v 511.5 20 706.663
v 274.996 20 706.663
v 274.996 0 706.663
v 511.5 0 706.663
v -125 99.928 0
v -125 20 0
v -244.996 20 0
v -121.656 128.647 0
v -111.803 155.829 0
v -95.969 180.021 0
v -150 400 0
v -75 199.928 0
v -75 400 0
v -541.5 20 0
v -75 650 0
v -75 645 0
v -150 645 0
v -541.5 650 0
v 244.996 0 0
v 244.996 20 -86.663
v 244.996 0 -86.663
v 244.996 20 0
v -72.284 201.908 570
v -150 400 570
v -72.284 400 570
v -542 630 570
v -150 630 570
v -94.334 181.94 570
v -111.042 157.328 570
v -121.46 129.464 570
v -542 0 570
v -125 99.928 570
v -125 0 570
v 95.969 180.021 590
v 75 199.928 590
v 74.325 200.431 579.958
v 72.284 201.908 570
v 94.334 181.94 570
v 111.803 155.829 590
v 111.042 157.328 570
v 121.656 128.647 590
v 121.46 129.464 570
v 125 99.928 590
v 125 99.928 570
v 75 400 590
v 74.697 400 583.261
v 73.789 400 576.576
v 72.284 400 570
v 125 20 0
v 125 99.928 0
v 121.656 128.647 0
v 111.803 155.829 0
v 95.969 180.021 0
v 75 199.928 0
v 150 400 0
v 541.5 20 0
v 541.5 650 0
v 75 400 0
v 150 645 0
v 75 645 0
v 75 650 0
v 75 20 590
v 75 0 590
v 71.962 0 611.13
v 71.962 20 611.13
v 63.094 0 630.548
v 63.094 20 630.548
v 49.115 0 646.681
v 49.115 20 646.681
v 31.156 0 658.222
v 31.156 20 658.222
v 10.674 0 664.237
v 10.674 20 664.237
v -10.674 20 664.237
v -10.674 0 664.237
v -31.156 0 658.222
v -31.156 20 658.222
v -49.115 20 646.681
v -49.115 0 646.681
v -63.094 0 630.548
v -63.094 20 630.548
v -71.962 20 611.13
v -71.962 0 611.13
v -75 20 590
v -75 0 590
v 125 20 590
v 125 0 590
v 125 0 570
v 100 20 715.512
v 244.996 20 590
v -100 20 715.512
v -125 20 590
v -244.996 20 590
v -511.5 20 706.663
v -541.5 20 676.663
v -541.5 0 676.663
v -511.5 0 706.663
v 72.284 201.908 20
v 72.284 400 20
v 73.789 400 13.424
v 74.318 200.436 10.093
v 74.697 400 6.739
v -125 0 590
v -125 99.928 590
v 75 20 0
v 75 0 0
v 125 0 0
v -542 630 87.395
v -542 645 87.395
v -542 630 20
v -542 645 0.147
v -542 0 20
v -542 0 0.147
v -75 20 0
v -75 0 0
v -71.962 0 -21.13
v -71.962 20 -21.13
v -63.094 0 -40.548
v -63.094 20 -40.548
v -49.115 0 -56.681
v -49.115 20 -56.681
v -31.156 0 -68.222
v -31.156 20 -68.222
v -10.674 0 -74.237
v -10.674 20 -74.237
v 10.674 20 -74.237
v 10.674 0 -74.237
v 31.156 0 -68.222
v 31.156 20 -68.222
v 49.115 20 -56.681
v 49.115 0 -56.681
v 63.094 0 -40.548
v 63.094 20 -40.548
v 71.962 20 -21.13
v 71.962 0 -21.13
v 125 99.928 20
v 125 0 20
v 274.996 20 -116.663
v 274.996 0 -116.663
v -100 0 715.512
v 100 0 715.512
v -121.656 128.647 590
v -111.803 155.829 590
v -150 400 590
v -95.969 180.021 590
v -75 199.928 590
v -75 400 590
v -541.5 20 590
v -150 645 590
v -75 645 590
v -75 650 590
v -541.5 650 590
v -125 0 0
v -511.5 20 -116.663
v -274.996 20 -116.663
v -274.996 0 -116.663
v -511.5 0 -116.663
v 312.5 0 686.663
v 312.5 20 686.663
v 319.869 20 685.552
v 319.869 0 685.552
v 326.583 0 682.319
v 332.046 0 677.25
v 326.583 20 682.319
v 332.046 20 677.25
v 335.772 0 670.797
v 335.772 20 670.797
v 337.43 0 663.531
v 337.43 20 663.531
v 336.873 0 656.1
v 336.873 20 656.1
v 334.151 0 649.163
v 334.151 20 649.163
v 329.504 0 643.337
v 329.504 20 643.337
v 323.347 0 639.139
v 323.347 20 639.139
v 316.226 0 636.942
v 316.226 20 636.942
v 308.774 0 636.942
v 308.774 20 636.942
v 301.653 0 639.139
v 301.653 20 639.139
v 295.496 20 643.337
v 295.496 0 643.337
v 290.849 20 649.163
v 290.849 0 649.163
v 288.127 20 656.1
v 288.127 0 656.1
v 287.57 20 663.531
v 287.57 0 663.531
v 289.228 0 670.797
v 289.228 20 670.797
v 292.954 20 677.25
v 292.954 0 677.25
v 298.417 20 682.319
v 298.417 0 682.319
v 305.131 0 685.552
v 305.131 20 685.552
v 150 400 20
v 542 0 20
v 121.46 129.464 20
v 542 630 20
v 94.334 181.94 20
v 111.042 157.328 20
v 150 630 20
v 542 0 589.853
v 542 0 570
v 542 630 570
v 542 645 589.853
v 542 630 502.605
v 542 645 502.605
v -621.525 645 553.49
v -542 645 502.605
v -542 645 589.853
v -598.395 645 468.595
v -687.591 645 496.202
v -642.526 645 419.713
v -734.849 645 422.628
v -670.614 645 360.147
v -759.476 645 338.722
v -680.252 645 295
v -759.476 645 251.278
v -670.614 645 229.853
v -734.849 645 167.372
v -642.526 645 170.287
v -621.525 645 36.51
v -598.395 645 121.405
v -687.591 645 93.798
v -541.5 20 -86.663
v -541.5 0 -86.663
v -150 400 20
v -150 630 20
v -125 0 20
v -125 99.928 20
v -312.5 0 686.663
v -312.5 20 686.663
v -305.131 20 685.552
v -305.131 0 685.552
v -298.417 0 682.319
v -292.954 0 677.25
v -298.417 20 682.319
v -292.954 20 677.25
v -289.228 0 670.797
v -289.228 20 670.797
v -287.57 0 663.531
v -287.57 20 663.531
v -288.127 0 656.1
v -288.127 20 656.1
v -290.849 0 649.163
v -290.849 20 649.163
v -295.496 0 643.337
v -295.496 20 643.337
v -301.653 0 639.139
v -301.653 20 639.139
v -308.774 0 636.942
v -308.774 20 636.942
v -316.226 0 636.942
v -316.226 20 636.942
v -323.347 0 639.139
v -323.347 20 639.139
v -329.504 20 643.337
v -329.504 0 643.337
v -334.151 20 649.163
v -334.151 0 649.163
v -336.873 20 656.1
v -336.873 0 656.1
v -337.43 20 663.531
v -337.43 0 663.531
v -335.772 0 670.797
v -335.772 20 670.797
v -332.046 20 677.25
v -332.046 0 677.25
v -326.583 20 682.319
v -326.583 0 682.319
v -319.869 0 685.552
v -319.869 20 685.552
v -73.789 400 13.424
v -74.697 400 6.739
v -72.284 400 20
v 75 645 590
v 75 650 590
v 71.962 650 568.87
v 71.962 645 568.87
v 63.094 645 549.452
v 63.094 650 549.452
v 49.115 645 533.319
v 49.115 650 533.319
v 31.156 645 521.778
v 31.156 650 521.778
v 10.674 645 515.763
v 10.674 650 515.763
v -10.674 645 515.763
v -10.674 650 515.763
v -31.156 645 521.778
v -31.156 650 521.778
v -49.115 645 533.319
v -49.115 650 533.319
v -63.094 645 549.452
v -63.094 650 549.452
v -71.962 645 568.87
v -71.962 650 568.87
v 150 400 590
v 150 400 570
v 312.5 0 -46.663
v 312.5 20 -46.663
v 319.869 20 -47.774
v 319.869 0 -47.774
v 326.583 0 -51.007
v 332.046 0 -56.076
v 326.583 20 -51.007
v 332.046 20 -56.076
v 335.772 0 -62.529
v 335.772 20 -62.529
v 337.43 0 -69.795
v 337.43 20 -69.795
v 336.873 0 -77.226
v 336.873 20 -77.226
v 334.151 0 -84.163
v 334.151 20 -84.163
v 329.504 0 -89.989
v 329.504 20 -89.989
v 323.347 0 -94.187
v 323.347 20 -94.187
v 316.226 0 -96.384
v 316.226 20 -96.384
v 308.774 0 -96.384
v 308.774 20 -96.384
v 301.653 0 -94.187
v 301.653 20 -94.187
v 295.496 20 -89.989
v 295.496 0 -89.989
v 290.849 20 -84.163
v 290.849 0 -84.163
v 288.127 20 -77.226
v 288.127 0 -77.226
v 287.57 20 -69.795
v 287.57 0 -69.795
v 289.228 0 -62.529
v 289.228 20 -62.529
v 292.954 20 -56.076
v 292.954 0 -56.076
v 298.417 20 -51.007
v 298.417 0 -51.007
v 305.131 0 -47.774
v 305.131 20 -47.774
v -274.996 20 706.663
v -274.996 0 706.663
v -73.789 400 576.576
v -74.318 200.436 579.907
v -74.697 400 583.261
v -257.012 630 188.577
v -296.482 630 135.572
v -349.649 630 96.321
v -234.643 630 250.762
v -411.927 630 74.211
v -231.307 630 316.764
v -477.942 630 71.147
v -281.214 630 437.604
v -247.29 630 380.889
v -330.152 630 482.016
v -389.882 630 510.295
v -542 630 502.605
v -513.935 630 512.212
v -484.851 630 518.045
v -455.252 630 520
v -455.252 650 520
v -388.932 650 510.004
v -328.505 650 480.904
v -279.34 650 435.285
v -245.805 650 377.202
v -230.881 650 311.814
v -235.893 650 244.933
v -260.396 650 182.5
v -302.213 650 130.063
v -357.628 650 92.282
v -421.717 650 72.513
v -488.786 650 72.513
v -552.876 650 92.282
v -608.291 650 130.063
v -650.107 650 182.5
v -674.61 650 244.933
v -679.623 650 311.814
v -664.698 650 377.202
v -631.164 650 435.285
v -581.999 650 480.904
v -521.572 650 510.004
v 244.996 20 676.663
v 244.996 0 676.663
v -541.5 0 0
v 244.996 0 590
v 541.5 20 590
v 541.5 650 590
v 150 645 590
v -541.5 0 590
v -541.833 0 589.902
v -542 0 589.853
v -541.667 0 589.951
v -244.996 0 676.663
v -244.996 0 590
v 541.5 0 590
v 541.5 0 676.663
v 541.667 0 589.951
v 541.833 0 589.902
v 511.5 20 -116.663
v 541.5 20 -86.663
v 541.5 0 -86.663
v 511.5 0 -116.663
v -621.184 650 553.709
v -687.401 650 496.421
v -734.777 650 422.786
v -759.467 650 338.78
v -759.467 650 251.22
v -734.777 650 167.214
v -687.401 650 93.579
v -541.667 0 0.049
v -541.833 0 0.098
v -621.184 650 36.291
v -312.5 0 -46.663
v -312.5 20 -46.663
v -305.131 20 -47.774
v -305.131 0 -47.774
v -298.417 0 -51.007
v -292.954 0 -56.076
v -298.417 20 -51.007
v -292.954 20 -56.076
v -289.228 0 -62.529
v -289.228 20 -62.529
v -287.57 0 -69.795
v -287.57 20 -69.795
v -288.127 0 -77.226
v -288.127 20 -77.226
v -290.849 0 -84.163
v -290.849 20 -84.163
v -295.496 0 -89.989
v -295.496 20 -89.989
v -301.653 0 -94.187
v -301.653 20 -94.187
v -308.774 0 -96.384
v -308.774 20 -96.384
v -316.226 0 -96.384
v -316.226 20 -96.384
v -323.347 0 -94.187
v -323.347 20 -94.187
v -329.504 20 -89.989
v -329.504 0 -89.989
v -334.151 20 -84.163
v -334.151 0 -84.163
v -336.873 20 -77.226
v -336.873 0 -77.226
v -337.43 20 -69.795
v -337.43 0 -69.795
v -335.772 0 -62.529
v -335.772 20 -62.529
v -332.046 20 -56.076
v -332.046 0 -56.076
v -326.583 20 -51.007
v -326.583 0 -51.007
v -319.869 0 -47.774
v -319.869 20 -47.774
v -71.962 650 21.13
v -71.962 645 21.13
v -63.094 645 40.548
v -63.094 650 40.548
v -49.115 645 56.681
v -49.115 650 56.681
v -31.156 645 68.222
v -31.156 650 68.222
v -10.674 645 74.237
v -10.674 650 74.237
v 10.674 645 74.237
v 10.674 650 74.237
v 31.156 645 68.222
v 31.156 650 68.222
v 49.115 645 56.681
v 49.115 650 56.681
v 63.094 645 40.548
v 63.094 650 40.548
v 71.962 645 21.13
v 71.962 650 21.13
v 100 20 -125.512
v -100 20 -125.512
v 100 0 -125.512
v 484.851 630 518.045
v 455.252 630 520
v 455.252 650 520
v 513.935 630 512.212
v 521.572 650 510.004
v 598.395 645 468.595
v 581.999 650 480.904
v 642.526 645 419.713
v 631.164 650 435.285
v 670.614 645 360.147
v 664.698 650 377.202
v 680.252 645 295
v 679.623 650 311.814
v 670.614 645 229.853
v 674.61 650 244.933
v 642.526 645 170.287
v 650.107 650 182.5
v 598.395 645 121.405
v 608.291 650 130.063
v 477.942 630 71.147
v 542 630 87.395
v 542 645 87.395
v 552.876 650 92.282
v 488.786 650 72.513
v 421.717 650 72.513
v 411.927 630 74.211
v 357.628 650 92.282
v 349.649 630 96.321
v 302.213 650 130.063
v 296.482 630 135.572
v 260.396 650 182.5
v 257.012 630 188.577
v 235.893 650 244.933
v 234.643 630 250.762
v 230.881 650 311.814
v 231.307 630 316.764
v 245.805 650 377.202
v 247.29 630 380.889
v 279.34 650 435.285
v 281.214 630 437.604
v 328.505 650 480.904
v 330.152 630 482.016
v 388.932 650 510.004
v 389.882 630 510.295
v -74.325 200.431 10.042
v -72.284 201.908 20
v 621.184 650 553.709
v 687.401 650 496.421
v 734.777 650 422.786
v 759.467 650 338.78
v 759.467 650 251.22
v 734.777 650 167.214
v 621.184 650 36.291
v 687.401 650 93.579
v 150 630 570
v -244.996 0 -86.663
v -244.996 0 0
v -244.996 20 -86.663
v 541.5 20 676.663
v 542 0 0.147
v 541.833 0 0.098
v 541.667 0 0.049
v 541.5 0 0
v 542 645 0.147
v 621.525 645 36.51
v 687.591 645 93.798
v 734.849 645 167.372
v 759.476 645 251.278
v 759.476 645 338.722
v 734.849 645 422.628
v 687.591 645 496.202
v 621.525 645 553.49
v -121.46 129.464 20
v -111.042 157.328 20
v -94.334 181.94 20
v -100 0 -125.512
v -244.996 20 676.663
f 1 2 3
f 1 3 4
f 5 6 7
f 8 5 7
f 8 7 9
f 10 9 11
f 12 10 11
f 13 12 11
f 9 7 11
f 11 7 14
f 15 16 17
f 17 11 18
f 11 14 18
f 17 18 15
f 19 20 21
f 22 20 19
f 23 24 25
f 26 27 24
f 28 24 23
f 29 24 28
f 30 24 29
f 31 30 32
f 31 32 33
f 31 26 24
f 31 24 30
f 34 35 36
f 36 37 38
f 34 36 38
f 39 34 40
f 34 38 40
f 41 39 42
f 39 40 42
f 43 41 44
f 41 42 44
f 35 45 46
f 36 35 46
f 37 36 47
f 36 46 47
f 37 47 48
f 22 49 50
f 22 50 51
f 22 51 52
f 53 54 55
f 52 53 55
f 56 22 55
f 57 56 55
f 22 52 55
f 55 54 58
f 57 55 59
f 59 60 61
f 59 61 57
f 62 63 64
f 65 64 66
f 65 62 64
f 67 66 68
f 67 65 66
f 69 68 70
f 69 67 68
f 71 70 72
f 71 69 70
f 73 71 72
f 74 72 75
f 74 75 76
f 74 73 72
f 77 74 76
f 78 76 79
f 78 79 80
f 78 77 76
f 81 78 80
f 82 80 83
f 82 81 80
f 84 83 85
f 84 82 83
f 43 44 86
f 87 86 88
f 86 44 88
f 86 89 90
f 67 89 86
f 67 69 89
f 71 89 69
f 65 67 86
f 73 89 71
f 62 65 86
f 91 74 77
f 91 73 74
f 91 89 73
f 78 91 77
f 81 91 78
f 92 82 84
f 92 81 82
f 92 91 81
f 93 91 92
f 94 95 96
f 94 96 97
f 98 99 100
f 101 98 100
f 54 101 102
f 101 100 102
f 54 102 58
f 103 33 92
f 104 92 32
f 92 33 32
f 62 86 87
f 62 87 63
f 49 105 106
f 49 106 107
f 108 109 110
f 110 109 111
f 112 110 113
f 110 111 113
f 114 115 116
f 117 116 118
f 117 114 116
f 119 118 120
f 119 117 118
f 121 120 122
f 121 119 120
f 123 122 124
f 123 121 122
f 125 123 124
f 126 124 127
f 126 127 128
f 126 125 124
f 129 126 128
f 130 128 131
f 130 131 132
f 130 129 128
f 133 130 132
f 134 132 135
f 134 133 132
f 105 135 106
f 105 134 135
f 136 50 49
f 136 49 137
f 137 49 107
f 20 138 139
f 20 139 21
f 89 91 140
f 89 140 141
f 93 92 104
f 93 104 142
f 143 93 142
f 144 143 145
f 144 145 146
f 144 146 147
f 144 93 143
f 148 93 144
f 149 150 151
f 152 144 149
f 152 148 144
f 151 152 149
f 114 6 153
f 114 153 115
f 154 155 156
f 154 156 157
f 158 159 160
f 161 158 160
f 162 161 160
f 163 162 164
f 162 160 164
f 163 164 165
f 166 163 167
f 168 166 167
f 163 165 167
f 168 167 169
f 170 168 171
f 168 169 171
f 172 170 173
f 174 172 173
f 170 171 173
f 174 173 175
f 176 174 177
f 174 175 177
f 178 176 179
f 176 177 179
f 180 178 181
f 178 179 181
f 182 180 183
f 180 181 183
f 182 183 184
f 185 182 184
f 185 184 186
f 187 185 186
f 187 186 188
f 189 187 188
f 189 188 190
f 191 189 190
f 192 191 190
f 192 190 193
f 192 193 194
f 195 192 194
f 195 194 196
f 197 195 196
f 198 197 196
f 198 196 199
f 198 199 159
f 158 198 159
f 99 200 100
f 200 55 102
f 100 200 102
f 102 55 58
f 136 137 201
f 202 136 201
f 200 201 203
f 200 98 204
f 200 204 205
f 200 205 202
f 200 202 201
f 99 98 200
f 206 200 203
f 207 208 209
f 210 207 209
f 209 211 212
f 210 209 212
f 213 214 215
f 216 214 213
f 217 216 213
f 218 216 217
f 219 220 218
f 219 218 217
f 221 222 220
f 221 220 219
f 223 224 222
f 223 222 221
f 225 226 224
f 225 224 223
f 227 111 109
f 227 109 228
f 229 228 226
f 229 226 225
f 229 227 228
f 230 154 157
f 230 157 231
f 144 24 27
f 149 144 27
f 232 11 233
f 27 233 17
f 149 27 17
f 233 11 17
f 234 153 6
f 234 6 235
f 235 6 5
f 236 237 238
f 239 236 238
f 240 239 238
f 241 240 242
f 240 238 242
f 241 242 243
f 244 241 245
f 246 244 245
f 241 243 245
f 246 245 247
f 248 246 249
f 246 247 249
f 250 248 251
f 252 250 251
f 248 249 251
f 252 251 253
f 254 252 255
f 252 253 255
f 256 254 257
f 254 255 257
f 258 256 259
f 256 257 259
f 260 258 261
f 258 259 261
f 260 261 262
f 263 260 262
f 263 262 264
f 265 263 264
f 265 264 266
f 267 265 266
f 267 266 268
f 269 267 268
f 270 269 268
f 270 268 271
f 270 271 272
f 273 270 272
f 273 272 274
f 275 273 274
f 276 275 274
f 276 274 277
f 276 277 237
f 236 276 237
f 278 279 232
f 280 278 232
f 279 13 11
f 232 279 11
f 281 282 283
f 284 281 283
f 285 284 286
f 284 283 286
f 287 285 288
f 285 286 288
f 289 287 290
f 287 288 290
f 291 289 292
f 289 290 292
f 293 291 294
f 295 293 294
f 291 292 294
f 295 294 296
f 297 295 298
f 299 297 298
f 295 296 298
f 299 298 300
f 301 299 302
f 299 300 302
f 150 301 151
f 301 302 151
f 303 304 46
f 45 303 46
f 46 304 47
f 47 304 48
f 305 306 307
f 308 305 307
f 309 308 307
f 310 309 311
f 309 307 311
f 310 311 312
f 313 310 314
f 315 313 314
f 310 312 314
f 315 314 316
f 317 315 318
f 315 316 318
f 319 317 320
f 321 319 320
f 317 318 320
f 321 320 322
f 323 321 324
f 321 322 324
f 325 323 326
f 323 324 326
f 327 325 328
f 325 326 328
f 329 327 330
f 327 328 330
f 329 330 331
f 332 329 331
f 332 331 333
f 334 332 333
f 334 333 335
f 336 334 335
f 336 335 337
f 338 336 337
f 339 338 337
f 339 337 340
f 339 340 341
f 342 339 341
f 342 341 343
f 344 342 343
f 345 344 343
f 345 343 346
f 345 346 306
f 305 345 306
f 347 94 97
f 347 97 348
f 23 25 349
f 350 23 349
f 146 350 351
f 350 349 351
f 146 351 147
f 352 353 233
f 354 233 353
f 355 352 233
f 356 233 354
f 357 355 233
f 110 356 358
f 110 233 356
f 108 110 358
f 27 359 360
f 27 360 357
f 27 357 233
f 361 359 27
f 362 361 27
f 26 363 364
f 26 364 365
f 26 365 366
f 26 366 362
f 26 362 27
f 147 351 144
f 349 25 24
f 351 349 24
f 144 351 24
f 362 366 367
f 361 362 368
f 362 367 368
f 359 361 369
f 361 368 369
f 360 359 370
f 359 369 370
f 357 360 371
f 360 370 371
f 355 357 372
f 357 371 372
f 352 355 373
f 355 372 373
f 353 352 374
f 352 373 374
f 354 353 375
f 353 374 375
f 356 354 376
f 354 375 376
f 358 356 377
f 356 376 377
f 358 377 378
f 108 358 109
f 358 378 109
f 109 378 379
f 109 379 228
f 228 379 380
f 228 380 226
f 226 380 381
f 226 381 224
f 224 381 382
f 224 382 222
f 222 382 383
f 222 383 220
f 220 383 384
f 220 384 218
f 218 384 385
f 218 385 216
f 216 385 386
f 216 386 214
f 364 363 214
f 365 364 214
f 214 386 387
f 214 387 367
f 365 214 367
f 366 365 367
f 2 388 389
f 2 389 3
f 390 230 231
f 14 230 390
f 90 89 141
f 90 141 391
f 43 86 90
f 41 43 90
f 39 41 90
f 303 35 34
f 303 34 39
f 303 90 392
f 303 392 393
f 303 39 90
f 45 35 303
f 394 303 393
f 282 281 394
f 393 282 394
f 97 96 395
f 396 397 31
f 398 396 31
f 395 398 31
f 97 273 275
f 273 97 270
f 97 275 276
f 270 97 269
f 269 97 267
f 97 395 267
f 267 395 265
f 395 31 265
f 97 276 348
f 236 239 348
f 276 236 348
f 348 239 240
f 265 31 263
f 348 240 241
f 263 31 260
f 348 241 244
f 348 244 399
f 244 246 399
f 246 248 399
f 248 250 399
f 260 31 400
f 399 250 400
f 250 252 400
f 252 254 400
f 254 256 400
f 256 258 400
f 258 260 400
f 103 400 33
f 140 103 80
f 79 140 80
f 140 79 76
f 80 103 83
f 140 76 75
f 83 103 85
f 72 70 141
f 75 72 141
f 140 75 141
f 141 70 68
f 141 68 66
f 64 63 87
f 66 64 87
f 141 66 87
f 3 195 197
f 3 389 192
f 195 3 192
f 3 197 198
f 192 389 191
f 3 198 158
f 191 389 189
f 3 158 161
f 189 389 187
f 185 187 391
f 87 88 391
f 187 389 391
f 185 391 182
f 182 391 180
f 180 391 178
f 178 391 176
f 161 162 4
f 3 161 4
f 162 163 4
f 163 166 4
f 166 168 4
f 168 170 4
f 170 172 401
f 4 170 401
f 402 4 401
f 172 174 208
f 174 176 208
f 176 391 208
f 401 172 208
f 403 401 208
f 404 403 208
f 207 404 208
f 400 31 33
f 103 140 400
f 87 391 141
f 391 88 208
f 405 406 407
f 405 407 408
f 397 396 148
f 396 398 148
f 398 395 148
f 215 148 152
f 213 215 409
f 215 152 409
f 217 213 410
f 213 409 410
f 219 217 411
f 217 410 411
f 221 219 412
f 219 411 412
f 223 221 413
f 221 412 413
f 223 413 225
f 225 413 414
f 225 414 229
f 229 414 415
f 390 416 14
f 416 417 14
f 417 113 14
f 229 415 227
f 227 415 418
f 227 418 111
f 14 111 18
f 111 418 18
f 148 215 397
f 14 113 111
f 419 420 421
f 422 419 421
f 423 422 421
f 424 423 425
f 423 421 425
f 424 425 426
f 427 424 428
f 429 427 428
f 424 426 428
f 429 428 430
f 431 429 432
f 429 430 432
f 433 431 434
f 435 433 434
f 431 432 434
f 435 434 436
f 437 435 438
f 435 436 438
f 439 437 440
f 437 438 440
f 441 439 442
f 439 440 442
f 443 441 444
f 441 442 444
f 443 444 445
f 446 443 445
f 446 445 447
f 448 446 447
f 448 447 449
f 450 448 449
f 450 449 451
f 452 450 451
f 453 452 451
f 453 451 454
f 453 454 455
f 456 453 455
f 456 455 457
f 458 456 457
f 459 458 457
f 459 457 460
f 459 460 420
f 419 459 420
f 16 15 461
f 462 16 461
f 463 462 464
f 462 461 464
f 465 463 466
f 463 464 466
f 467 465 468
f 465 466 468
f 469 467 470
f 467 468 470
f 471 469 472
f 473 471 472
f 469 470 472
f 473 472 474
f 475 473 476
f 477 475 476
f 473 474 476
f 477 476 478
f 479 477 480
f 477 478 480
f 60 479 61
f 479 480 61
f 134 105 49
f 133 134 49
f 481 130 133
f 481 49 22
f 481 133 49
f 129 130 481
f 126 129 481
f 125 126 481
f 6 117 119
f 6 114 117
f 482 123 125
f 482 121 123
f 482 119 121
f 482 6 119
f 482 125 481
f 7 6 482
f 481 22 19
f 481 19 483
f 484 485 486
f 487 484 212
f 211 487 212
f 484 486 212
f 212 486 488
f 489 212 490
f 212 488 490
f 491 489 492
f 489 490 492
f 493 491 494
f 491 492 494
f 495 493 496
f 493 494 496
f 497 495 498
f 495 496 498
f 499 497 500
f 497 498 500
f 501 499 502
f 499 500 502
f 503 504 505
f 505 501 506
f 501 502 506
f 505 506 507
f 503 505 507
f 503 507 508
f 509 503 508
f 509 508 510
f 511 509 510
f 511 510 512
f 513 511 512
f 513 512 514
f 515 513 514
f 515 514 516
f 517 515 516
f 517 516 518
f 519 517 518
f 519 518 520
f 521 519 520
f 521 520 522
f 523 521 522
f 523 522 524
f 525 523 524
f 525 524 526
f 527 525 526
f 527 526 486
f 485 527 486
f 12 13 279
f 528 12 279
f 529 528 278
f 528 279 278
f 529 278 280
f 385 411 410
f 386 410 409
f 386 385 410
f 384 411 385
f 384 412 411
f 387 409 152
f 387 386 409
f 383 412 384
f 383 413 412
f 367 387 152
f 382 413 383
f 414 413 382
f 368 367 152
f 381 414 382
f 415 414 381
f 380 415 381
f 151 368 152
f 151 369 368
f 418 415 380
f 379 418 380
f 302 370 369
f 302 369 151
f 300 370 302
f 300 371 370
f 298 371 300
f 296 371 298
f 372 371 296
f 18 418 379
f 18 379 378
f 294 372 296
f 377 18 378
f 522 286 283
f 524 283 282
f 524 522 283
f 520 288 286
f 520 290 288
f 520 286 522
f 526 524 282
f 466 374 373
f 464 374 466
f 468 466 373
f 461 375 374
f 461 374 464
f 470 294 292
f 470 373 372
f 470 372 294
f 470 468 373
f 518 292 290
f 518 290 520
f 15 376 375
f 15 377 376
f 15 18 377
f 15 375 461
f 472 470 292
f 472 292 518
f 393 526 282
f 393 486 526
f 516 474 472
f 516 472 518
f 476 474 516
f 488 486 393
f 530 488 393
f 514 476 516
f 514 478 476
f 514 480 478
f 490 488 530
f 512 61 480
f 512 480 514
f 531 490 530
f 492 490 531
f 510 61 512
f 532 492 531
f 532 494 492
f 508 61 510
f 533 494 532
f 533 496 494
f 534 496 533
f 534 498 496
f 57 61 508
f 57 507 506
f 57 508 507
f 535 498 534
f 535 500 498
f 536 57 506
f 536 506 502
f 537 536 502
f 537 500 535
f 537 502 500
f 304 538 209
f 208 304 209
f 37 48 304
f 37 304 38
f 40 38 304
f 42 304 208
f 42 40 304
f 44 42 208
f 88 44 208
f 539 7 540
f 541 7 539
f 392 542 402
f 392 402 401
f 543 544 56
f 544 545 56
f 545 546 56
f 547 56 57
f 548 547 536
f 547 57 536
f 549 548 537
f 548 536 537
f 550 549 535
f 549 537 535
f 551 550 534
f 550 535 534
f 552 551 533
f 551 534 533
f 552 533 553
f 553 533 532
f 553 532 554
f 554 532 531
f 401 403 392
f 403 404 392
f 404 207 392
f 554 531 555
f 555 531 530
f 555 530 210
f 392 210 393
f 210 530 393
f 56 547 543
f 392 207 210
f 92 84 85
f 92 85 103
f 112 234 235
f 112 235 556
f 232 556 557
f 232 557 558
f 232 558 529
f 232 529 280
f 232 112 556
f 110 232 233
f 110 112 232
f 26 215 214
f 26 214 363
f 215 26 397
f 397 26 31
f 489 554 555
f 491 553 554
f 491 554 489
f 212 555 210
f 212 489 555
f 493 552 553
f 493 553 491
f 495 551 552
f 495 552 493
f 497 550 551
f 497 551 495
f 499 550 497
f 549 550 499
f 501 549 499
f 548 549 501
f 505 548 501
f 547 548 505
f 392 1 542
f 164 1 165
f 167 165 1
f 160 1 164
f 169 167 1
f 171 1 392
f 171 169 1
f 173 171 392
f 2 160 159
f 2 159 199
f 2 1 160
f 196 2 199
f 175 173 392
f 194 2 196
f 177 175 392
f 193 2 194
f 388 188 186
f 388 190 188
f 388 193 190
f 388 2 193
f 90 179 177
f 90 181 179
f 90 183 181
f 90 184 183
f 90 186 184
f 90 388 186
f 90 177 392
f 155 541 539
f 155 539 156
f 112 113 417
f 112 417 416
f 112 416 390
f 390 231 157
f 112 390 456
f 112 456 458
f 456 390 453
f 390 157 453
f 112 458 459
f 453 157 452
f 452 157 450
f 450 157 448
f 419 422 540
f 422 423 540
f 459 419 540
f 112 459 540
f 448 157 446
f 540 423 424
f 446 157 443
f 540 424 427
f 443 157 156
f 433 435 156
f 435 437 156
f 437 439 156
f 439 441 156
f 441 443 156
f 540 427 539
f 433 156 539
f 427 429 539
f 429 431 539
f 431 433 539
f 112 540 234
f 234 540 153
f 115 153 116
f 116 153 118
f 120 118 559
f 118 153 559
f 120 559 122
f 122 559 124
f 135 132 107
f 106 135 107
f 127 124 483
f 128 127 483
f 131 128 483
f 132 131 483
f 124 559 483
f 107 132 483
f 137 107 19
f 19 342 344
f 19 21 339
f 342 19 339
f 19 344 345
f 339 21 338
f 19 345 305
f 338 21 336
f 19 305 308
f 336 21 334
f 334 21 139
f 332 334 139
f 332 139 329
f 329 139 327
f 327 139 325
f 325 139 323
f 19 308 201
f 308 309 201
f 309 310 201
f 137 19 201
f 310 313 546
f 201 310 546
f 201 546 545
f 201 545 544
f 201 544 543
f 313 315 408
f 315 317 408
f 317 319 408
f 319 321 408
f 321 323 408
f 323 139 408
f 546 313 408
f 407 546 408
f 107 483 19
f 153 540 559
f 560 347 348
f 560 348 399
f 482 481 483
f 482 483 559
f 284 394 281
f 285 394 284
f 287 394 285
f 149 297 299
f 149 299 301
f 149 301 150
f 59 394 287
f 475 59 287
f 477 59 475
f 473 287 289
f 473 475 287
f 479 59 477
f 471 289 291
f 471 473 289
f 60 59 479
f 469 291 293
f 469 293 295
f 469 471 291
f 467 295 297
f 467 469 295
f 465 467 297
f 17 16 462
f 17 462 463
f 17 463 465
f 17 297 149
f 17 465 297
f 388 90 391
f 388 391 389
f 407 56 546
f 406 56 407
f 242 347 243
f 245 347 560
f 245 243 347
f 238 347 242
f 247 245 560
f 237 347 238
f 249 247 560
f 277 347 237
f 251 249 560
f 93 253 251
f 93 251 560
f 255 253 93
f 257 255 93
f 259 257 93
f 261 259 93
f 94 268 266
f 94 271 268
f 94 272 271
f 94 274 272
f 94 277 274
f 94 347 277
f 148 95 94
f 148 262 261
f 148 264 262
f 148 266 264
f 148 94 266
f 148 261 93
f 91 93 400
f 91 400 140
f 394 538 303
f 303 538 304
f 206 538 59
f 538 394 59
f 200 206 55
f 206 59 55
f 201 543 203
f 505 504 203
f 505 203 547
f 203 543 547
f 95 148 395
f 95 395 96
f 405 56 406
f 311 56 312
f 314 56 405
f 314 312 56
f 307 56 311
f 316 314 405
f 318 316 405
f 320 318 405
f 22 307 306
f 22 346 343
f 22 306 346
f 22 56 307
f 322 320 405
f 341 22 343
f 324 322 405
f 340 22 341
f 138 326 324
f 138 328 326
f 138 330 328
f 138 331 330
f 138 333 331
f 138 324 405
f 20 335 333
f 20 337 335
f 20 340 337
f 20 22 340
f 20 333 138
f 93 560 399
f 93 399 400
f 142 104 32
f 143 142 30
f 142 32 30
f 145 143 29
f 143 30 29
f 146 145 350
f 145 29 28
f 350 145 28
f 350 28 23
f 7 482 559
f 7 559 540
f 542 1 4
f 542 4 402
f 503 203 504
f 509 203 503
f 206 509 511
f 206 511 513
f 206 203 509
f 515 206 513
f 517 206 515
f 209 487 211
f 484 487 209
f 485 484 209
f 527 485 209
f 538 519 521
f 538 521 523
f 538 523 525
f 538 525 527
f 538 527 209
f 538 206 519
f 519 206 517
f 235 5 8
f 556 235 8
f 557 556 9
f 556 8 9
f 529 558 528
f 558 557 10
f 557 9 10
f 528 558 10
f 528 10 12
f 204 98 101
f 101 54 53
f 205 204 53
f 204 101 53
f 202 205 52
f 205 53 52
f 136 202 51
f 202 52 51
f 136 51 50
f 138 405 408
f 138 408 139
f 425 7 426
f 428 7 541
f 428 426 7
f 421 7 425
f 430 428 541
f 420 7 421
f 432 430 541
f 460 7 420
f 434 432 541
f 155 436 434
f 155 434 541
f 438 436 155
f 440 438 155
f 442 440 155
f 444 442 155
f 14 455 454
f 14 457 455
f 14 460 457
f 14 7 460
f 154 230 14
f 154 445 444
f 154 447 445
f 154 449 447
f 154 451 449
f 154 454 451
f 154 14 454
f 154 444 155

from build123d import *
from build123d.topology import SkipClean

# Parameters (mm, degrees)
SKETCH1_W               = 300
SKETCH1_H               = 245
BOSS_EXTRUDE1_DEPTH     = 590
SKETCH2_R               = 25
BOSS_EXTRUDE2_DEPTH     = 650
SKETCH2_4_R             = 225
CUT_EXTRUDE2_DEPTH      = 1236.329432749
CUT_EXTRUDE4_DEPTH      = 1624.31086661
CUT_EXTRUDE4_DEPTH_BACK = 1624.31086661
SKETCH3_W               = 274.95540651
SKETCH3_H               = 630
SKETCH3_W_2             = 550
SKETCH3_H_2             = 742.404091098
SKETCH3_W_3             = 176.90498613


with BuildPart() as part:
    # Sketch1 → Boss-Extrude1 (new body)
    with BuildSketch(Plane.XY):
        with BuildLine():
            Line((-542, 645), (-542, 0))
            Line((-542, 0), (-125, 0))
            Line((-125, 0), (-125, 99.927755898))
            ThreePointArc((-125, 99.927755898), (0, 224.927755898), (125, 99.927755898))
            Line((125, 99.927755898), (125, 0))
            Line((125, 0), (542, 0))
            Line((542, 0), (542, 645))
            Line((542, 645), (769.142885948, 645))
            Line((769.142885948, 645), (769.142885948, 650))
            Line((769.142885948, 650), (-769.142885948, 650))
            Line((-769.142885948, 650), (-769.142885948, 645))
            Line((-769.142885948, 645), (-542, 645))
        make_face()
        with Locations((0, 522.5)):
            Rectangle(SKETCH1_W, SKETCH1_H, mode=Mode.SUBTRACT)
    extrude(amount=BOSS_EXTRUDE1_DEPTH)

    # Sketch2 → Boss-Extrude2 (add)
    # profile 1 of 6: a face of its own
    with BuildSketch(Plane(origin=(0, 650, 0), x_dir=(1, 0, 0), z_dir=(0, 1, 0))):
        Polygon((-541.5, 86.663012773), (-541.5, 0), (-244.996182612, 0), (-244.996182612, 86.663012773), (-274.996182612, 116.663012773), (-511.5, 116.663012773), align=None)
        with Locations((-312.5, 71.663012773)):
            Circle(SKETCH2_R, mode=Mode.SUBTRACT)
    # profile 2 of 6: a face of its own
    with BuildSketch(Plane(origin=(0, 650, 0), x_dir=(1, 0, 0), z_dir=(0, 1, 0))):
        with BuildLine():
            Line((-100, 125.512423659), (-244.996182612, 0))
            Line((-244.996182612, 0), (-75, 0))
            ThreePointArc((-75, 0), (0, 75), (75, 0))
            Line((75, 0), (244.996182612, 0))
            Line((244.996182612, 0), (100, 125.512423659))
            Line((100, 125.512423659), (-100, 125.512423659))
        make_face()
    # profile 3 of 6: a face of its own
    with BuildSketch(Plane(origin=(0, 650, 0), x_dir=(1, 0, 0), z_dir=(0, 1, 0))):
        Polygon((-244.996182612, -590), (-541.5, -590), (-541.5, -676.663012773), (-511.5, -706.663012773), (-274.996182612, -706.663012773), (-244.996182612, -676.663012773), align=None)
        with Locations((-312.5, -661.663012773)):
            Circle(SKETCH2_R, mode=Mode.SUBTRACT)
    # profile 4 of 6: a face of its own
    with BuildSketch(Plane(origin=(0, 650, 0), x_dir=(1, 0, 0), z_dir=(0, 1, 0))):
        with BuildLine():
            Line((-75, -590), (-244.996182612, -590))
            Line((-244.996182612, -590), (-100, -715.512423659))
            Line((-100, -715.512423659), (100, -715.512423659))
            Line((100, -715.512423659), (244.996182612, -590))
            Line((244.996182612, -590), (75, -590))
            ThreePointArc((75, -590), (0, -665), (-75, -590))
        make_face()
    # profile 5 of 6: a face of its own
    with BuildSketch(Plane(origin=(0, 650, 0), x_dir=(1, 0, 0), z_dir=(0, 1, 0))):
        Polygon((244.996182612, 86.663012773), (244.996182612, 0), (541.5, 0), (541.5, 86.663012773), (511.5, 116.663012773), (274.996182612, 116.663012773), align=None)
        with Locations((312.5, 71.663012773)):
            Circle(SKETCH2_R, mode=Mode.SUBTRACT)
    # profile 6 of 6: a face of its own
    with BuildSketch(Plane(origin=(0, 650, 0), x_dir=(1, 0, 0), z_dir=(0, 1, 0))):
        Polygon((541.5, -590), (244.996182612, -590), (244.996182612, -676.663012773), (274.996182612, -706.663012773), (511.5, -706.663012773), (541.5, -676.663012773), align=None)
        with Locations((312.5, -661.663012773)):
            Circle(SKETCH2_R, mode=Mode.SUBTRACT)
    extrude(amount=-BOSS_EXTRUDE2_DEPTH)

    # Sketch2<4> → Cut-Extrude2 (cut, through all)
    with SkipClean():  # the faces are left unmerged after this step: merging them gives an invalid solid
        with BuildSketch(Plane(origin=(0, 650, 0), x_dir=(1, 0, 0), z_dir=(0, 1, 0))):
            with BuildLine():
                ThreePointArc((-541.5, -590), (-762.601277219, -295), (-541.5, 0))
                Line((-541.5, 0), (-769.142885948, 0))
                Line((-769.142885948, 0), (-769.142885948, -590))
                Line((-769.142885948, -590), (-541.5, -590))
            make_face()
            with BuildLine():
                Line((75, 0), (-75, 0))
                ThreePointArc((-75, 0), (0, -75), (75, 0))
            make_face()
            with BuildLine():
                ThreePointArc((75, -590), (0, -515), (-75, -590))
                Line((-75, -590), (75, -590))
            make_face()
            with BuildLine():
                Line((769.142885948, 0), (541.5, 0))
                ThreePointArc((541.5, 0), (762.601277219, -295), (541.5, -590))
                Line((541.5, -590), (769.142885948, -590))
                Line((769.142885948, -590), (769.142885948, 0))
            make_face()
            with Locations((-455.251684993, -295)):
                Circle(SKETCH2_4_R)
            with Locations((455.251684993, -295)):
                Circle(SKETCH2_4_R)
        extrude(amount=-CUT_EXTRUDE2_DEPTH, mode=Mode.SUBTRACT)

    # Sketch3 → Cut-Extrude4 (cut, two sides: drawn at the far end of the back side and taken through both)
    with BuildSketch(Plane(origin=(541.5, 0, 0), x_dir=(0, 0, -1), z_dir=(1, 0, 0)).offset(-CUT_EXTRUDE4_DEPTH_BACK)):
        with Locations((-727.477703255, 335)):
            Rectangle(SKETCH3_W, SKETCH3_H)
        with Locations((-295, 258.797954451)):
            Rectangle(SKETCH3_W_2, SKETCH3_H_2)
        with Locations((88.452493065, 335)):
            Rectangle(SKETCH3_W_3, SKETCH3_H)
    extrude(amount=CUT_EXTRUDE4_DEPTH + CUT_EXTRUDE4_DEPTH_BACK, mode=Mode.SUBTRACT)


solid = part.part
